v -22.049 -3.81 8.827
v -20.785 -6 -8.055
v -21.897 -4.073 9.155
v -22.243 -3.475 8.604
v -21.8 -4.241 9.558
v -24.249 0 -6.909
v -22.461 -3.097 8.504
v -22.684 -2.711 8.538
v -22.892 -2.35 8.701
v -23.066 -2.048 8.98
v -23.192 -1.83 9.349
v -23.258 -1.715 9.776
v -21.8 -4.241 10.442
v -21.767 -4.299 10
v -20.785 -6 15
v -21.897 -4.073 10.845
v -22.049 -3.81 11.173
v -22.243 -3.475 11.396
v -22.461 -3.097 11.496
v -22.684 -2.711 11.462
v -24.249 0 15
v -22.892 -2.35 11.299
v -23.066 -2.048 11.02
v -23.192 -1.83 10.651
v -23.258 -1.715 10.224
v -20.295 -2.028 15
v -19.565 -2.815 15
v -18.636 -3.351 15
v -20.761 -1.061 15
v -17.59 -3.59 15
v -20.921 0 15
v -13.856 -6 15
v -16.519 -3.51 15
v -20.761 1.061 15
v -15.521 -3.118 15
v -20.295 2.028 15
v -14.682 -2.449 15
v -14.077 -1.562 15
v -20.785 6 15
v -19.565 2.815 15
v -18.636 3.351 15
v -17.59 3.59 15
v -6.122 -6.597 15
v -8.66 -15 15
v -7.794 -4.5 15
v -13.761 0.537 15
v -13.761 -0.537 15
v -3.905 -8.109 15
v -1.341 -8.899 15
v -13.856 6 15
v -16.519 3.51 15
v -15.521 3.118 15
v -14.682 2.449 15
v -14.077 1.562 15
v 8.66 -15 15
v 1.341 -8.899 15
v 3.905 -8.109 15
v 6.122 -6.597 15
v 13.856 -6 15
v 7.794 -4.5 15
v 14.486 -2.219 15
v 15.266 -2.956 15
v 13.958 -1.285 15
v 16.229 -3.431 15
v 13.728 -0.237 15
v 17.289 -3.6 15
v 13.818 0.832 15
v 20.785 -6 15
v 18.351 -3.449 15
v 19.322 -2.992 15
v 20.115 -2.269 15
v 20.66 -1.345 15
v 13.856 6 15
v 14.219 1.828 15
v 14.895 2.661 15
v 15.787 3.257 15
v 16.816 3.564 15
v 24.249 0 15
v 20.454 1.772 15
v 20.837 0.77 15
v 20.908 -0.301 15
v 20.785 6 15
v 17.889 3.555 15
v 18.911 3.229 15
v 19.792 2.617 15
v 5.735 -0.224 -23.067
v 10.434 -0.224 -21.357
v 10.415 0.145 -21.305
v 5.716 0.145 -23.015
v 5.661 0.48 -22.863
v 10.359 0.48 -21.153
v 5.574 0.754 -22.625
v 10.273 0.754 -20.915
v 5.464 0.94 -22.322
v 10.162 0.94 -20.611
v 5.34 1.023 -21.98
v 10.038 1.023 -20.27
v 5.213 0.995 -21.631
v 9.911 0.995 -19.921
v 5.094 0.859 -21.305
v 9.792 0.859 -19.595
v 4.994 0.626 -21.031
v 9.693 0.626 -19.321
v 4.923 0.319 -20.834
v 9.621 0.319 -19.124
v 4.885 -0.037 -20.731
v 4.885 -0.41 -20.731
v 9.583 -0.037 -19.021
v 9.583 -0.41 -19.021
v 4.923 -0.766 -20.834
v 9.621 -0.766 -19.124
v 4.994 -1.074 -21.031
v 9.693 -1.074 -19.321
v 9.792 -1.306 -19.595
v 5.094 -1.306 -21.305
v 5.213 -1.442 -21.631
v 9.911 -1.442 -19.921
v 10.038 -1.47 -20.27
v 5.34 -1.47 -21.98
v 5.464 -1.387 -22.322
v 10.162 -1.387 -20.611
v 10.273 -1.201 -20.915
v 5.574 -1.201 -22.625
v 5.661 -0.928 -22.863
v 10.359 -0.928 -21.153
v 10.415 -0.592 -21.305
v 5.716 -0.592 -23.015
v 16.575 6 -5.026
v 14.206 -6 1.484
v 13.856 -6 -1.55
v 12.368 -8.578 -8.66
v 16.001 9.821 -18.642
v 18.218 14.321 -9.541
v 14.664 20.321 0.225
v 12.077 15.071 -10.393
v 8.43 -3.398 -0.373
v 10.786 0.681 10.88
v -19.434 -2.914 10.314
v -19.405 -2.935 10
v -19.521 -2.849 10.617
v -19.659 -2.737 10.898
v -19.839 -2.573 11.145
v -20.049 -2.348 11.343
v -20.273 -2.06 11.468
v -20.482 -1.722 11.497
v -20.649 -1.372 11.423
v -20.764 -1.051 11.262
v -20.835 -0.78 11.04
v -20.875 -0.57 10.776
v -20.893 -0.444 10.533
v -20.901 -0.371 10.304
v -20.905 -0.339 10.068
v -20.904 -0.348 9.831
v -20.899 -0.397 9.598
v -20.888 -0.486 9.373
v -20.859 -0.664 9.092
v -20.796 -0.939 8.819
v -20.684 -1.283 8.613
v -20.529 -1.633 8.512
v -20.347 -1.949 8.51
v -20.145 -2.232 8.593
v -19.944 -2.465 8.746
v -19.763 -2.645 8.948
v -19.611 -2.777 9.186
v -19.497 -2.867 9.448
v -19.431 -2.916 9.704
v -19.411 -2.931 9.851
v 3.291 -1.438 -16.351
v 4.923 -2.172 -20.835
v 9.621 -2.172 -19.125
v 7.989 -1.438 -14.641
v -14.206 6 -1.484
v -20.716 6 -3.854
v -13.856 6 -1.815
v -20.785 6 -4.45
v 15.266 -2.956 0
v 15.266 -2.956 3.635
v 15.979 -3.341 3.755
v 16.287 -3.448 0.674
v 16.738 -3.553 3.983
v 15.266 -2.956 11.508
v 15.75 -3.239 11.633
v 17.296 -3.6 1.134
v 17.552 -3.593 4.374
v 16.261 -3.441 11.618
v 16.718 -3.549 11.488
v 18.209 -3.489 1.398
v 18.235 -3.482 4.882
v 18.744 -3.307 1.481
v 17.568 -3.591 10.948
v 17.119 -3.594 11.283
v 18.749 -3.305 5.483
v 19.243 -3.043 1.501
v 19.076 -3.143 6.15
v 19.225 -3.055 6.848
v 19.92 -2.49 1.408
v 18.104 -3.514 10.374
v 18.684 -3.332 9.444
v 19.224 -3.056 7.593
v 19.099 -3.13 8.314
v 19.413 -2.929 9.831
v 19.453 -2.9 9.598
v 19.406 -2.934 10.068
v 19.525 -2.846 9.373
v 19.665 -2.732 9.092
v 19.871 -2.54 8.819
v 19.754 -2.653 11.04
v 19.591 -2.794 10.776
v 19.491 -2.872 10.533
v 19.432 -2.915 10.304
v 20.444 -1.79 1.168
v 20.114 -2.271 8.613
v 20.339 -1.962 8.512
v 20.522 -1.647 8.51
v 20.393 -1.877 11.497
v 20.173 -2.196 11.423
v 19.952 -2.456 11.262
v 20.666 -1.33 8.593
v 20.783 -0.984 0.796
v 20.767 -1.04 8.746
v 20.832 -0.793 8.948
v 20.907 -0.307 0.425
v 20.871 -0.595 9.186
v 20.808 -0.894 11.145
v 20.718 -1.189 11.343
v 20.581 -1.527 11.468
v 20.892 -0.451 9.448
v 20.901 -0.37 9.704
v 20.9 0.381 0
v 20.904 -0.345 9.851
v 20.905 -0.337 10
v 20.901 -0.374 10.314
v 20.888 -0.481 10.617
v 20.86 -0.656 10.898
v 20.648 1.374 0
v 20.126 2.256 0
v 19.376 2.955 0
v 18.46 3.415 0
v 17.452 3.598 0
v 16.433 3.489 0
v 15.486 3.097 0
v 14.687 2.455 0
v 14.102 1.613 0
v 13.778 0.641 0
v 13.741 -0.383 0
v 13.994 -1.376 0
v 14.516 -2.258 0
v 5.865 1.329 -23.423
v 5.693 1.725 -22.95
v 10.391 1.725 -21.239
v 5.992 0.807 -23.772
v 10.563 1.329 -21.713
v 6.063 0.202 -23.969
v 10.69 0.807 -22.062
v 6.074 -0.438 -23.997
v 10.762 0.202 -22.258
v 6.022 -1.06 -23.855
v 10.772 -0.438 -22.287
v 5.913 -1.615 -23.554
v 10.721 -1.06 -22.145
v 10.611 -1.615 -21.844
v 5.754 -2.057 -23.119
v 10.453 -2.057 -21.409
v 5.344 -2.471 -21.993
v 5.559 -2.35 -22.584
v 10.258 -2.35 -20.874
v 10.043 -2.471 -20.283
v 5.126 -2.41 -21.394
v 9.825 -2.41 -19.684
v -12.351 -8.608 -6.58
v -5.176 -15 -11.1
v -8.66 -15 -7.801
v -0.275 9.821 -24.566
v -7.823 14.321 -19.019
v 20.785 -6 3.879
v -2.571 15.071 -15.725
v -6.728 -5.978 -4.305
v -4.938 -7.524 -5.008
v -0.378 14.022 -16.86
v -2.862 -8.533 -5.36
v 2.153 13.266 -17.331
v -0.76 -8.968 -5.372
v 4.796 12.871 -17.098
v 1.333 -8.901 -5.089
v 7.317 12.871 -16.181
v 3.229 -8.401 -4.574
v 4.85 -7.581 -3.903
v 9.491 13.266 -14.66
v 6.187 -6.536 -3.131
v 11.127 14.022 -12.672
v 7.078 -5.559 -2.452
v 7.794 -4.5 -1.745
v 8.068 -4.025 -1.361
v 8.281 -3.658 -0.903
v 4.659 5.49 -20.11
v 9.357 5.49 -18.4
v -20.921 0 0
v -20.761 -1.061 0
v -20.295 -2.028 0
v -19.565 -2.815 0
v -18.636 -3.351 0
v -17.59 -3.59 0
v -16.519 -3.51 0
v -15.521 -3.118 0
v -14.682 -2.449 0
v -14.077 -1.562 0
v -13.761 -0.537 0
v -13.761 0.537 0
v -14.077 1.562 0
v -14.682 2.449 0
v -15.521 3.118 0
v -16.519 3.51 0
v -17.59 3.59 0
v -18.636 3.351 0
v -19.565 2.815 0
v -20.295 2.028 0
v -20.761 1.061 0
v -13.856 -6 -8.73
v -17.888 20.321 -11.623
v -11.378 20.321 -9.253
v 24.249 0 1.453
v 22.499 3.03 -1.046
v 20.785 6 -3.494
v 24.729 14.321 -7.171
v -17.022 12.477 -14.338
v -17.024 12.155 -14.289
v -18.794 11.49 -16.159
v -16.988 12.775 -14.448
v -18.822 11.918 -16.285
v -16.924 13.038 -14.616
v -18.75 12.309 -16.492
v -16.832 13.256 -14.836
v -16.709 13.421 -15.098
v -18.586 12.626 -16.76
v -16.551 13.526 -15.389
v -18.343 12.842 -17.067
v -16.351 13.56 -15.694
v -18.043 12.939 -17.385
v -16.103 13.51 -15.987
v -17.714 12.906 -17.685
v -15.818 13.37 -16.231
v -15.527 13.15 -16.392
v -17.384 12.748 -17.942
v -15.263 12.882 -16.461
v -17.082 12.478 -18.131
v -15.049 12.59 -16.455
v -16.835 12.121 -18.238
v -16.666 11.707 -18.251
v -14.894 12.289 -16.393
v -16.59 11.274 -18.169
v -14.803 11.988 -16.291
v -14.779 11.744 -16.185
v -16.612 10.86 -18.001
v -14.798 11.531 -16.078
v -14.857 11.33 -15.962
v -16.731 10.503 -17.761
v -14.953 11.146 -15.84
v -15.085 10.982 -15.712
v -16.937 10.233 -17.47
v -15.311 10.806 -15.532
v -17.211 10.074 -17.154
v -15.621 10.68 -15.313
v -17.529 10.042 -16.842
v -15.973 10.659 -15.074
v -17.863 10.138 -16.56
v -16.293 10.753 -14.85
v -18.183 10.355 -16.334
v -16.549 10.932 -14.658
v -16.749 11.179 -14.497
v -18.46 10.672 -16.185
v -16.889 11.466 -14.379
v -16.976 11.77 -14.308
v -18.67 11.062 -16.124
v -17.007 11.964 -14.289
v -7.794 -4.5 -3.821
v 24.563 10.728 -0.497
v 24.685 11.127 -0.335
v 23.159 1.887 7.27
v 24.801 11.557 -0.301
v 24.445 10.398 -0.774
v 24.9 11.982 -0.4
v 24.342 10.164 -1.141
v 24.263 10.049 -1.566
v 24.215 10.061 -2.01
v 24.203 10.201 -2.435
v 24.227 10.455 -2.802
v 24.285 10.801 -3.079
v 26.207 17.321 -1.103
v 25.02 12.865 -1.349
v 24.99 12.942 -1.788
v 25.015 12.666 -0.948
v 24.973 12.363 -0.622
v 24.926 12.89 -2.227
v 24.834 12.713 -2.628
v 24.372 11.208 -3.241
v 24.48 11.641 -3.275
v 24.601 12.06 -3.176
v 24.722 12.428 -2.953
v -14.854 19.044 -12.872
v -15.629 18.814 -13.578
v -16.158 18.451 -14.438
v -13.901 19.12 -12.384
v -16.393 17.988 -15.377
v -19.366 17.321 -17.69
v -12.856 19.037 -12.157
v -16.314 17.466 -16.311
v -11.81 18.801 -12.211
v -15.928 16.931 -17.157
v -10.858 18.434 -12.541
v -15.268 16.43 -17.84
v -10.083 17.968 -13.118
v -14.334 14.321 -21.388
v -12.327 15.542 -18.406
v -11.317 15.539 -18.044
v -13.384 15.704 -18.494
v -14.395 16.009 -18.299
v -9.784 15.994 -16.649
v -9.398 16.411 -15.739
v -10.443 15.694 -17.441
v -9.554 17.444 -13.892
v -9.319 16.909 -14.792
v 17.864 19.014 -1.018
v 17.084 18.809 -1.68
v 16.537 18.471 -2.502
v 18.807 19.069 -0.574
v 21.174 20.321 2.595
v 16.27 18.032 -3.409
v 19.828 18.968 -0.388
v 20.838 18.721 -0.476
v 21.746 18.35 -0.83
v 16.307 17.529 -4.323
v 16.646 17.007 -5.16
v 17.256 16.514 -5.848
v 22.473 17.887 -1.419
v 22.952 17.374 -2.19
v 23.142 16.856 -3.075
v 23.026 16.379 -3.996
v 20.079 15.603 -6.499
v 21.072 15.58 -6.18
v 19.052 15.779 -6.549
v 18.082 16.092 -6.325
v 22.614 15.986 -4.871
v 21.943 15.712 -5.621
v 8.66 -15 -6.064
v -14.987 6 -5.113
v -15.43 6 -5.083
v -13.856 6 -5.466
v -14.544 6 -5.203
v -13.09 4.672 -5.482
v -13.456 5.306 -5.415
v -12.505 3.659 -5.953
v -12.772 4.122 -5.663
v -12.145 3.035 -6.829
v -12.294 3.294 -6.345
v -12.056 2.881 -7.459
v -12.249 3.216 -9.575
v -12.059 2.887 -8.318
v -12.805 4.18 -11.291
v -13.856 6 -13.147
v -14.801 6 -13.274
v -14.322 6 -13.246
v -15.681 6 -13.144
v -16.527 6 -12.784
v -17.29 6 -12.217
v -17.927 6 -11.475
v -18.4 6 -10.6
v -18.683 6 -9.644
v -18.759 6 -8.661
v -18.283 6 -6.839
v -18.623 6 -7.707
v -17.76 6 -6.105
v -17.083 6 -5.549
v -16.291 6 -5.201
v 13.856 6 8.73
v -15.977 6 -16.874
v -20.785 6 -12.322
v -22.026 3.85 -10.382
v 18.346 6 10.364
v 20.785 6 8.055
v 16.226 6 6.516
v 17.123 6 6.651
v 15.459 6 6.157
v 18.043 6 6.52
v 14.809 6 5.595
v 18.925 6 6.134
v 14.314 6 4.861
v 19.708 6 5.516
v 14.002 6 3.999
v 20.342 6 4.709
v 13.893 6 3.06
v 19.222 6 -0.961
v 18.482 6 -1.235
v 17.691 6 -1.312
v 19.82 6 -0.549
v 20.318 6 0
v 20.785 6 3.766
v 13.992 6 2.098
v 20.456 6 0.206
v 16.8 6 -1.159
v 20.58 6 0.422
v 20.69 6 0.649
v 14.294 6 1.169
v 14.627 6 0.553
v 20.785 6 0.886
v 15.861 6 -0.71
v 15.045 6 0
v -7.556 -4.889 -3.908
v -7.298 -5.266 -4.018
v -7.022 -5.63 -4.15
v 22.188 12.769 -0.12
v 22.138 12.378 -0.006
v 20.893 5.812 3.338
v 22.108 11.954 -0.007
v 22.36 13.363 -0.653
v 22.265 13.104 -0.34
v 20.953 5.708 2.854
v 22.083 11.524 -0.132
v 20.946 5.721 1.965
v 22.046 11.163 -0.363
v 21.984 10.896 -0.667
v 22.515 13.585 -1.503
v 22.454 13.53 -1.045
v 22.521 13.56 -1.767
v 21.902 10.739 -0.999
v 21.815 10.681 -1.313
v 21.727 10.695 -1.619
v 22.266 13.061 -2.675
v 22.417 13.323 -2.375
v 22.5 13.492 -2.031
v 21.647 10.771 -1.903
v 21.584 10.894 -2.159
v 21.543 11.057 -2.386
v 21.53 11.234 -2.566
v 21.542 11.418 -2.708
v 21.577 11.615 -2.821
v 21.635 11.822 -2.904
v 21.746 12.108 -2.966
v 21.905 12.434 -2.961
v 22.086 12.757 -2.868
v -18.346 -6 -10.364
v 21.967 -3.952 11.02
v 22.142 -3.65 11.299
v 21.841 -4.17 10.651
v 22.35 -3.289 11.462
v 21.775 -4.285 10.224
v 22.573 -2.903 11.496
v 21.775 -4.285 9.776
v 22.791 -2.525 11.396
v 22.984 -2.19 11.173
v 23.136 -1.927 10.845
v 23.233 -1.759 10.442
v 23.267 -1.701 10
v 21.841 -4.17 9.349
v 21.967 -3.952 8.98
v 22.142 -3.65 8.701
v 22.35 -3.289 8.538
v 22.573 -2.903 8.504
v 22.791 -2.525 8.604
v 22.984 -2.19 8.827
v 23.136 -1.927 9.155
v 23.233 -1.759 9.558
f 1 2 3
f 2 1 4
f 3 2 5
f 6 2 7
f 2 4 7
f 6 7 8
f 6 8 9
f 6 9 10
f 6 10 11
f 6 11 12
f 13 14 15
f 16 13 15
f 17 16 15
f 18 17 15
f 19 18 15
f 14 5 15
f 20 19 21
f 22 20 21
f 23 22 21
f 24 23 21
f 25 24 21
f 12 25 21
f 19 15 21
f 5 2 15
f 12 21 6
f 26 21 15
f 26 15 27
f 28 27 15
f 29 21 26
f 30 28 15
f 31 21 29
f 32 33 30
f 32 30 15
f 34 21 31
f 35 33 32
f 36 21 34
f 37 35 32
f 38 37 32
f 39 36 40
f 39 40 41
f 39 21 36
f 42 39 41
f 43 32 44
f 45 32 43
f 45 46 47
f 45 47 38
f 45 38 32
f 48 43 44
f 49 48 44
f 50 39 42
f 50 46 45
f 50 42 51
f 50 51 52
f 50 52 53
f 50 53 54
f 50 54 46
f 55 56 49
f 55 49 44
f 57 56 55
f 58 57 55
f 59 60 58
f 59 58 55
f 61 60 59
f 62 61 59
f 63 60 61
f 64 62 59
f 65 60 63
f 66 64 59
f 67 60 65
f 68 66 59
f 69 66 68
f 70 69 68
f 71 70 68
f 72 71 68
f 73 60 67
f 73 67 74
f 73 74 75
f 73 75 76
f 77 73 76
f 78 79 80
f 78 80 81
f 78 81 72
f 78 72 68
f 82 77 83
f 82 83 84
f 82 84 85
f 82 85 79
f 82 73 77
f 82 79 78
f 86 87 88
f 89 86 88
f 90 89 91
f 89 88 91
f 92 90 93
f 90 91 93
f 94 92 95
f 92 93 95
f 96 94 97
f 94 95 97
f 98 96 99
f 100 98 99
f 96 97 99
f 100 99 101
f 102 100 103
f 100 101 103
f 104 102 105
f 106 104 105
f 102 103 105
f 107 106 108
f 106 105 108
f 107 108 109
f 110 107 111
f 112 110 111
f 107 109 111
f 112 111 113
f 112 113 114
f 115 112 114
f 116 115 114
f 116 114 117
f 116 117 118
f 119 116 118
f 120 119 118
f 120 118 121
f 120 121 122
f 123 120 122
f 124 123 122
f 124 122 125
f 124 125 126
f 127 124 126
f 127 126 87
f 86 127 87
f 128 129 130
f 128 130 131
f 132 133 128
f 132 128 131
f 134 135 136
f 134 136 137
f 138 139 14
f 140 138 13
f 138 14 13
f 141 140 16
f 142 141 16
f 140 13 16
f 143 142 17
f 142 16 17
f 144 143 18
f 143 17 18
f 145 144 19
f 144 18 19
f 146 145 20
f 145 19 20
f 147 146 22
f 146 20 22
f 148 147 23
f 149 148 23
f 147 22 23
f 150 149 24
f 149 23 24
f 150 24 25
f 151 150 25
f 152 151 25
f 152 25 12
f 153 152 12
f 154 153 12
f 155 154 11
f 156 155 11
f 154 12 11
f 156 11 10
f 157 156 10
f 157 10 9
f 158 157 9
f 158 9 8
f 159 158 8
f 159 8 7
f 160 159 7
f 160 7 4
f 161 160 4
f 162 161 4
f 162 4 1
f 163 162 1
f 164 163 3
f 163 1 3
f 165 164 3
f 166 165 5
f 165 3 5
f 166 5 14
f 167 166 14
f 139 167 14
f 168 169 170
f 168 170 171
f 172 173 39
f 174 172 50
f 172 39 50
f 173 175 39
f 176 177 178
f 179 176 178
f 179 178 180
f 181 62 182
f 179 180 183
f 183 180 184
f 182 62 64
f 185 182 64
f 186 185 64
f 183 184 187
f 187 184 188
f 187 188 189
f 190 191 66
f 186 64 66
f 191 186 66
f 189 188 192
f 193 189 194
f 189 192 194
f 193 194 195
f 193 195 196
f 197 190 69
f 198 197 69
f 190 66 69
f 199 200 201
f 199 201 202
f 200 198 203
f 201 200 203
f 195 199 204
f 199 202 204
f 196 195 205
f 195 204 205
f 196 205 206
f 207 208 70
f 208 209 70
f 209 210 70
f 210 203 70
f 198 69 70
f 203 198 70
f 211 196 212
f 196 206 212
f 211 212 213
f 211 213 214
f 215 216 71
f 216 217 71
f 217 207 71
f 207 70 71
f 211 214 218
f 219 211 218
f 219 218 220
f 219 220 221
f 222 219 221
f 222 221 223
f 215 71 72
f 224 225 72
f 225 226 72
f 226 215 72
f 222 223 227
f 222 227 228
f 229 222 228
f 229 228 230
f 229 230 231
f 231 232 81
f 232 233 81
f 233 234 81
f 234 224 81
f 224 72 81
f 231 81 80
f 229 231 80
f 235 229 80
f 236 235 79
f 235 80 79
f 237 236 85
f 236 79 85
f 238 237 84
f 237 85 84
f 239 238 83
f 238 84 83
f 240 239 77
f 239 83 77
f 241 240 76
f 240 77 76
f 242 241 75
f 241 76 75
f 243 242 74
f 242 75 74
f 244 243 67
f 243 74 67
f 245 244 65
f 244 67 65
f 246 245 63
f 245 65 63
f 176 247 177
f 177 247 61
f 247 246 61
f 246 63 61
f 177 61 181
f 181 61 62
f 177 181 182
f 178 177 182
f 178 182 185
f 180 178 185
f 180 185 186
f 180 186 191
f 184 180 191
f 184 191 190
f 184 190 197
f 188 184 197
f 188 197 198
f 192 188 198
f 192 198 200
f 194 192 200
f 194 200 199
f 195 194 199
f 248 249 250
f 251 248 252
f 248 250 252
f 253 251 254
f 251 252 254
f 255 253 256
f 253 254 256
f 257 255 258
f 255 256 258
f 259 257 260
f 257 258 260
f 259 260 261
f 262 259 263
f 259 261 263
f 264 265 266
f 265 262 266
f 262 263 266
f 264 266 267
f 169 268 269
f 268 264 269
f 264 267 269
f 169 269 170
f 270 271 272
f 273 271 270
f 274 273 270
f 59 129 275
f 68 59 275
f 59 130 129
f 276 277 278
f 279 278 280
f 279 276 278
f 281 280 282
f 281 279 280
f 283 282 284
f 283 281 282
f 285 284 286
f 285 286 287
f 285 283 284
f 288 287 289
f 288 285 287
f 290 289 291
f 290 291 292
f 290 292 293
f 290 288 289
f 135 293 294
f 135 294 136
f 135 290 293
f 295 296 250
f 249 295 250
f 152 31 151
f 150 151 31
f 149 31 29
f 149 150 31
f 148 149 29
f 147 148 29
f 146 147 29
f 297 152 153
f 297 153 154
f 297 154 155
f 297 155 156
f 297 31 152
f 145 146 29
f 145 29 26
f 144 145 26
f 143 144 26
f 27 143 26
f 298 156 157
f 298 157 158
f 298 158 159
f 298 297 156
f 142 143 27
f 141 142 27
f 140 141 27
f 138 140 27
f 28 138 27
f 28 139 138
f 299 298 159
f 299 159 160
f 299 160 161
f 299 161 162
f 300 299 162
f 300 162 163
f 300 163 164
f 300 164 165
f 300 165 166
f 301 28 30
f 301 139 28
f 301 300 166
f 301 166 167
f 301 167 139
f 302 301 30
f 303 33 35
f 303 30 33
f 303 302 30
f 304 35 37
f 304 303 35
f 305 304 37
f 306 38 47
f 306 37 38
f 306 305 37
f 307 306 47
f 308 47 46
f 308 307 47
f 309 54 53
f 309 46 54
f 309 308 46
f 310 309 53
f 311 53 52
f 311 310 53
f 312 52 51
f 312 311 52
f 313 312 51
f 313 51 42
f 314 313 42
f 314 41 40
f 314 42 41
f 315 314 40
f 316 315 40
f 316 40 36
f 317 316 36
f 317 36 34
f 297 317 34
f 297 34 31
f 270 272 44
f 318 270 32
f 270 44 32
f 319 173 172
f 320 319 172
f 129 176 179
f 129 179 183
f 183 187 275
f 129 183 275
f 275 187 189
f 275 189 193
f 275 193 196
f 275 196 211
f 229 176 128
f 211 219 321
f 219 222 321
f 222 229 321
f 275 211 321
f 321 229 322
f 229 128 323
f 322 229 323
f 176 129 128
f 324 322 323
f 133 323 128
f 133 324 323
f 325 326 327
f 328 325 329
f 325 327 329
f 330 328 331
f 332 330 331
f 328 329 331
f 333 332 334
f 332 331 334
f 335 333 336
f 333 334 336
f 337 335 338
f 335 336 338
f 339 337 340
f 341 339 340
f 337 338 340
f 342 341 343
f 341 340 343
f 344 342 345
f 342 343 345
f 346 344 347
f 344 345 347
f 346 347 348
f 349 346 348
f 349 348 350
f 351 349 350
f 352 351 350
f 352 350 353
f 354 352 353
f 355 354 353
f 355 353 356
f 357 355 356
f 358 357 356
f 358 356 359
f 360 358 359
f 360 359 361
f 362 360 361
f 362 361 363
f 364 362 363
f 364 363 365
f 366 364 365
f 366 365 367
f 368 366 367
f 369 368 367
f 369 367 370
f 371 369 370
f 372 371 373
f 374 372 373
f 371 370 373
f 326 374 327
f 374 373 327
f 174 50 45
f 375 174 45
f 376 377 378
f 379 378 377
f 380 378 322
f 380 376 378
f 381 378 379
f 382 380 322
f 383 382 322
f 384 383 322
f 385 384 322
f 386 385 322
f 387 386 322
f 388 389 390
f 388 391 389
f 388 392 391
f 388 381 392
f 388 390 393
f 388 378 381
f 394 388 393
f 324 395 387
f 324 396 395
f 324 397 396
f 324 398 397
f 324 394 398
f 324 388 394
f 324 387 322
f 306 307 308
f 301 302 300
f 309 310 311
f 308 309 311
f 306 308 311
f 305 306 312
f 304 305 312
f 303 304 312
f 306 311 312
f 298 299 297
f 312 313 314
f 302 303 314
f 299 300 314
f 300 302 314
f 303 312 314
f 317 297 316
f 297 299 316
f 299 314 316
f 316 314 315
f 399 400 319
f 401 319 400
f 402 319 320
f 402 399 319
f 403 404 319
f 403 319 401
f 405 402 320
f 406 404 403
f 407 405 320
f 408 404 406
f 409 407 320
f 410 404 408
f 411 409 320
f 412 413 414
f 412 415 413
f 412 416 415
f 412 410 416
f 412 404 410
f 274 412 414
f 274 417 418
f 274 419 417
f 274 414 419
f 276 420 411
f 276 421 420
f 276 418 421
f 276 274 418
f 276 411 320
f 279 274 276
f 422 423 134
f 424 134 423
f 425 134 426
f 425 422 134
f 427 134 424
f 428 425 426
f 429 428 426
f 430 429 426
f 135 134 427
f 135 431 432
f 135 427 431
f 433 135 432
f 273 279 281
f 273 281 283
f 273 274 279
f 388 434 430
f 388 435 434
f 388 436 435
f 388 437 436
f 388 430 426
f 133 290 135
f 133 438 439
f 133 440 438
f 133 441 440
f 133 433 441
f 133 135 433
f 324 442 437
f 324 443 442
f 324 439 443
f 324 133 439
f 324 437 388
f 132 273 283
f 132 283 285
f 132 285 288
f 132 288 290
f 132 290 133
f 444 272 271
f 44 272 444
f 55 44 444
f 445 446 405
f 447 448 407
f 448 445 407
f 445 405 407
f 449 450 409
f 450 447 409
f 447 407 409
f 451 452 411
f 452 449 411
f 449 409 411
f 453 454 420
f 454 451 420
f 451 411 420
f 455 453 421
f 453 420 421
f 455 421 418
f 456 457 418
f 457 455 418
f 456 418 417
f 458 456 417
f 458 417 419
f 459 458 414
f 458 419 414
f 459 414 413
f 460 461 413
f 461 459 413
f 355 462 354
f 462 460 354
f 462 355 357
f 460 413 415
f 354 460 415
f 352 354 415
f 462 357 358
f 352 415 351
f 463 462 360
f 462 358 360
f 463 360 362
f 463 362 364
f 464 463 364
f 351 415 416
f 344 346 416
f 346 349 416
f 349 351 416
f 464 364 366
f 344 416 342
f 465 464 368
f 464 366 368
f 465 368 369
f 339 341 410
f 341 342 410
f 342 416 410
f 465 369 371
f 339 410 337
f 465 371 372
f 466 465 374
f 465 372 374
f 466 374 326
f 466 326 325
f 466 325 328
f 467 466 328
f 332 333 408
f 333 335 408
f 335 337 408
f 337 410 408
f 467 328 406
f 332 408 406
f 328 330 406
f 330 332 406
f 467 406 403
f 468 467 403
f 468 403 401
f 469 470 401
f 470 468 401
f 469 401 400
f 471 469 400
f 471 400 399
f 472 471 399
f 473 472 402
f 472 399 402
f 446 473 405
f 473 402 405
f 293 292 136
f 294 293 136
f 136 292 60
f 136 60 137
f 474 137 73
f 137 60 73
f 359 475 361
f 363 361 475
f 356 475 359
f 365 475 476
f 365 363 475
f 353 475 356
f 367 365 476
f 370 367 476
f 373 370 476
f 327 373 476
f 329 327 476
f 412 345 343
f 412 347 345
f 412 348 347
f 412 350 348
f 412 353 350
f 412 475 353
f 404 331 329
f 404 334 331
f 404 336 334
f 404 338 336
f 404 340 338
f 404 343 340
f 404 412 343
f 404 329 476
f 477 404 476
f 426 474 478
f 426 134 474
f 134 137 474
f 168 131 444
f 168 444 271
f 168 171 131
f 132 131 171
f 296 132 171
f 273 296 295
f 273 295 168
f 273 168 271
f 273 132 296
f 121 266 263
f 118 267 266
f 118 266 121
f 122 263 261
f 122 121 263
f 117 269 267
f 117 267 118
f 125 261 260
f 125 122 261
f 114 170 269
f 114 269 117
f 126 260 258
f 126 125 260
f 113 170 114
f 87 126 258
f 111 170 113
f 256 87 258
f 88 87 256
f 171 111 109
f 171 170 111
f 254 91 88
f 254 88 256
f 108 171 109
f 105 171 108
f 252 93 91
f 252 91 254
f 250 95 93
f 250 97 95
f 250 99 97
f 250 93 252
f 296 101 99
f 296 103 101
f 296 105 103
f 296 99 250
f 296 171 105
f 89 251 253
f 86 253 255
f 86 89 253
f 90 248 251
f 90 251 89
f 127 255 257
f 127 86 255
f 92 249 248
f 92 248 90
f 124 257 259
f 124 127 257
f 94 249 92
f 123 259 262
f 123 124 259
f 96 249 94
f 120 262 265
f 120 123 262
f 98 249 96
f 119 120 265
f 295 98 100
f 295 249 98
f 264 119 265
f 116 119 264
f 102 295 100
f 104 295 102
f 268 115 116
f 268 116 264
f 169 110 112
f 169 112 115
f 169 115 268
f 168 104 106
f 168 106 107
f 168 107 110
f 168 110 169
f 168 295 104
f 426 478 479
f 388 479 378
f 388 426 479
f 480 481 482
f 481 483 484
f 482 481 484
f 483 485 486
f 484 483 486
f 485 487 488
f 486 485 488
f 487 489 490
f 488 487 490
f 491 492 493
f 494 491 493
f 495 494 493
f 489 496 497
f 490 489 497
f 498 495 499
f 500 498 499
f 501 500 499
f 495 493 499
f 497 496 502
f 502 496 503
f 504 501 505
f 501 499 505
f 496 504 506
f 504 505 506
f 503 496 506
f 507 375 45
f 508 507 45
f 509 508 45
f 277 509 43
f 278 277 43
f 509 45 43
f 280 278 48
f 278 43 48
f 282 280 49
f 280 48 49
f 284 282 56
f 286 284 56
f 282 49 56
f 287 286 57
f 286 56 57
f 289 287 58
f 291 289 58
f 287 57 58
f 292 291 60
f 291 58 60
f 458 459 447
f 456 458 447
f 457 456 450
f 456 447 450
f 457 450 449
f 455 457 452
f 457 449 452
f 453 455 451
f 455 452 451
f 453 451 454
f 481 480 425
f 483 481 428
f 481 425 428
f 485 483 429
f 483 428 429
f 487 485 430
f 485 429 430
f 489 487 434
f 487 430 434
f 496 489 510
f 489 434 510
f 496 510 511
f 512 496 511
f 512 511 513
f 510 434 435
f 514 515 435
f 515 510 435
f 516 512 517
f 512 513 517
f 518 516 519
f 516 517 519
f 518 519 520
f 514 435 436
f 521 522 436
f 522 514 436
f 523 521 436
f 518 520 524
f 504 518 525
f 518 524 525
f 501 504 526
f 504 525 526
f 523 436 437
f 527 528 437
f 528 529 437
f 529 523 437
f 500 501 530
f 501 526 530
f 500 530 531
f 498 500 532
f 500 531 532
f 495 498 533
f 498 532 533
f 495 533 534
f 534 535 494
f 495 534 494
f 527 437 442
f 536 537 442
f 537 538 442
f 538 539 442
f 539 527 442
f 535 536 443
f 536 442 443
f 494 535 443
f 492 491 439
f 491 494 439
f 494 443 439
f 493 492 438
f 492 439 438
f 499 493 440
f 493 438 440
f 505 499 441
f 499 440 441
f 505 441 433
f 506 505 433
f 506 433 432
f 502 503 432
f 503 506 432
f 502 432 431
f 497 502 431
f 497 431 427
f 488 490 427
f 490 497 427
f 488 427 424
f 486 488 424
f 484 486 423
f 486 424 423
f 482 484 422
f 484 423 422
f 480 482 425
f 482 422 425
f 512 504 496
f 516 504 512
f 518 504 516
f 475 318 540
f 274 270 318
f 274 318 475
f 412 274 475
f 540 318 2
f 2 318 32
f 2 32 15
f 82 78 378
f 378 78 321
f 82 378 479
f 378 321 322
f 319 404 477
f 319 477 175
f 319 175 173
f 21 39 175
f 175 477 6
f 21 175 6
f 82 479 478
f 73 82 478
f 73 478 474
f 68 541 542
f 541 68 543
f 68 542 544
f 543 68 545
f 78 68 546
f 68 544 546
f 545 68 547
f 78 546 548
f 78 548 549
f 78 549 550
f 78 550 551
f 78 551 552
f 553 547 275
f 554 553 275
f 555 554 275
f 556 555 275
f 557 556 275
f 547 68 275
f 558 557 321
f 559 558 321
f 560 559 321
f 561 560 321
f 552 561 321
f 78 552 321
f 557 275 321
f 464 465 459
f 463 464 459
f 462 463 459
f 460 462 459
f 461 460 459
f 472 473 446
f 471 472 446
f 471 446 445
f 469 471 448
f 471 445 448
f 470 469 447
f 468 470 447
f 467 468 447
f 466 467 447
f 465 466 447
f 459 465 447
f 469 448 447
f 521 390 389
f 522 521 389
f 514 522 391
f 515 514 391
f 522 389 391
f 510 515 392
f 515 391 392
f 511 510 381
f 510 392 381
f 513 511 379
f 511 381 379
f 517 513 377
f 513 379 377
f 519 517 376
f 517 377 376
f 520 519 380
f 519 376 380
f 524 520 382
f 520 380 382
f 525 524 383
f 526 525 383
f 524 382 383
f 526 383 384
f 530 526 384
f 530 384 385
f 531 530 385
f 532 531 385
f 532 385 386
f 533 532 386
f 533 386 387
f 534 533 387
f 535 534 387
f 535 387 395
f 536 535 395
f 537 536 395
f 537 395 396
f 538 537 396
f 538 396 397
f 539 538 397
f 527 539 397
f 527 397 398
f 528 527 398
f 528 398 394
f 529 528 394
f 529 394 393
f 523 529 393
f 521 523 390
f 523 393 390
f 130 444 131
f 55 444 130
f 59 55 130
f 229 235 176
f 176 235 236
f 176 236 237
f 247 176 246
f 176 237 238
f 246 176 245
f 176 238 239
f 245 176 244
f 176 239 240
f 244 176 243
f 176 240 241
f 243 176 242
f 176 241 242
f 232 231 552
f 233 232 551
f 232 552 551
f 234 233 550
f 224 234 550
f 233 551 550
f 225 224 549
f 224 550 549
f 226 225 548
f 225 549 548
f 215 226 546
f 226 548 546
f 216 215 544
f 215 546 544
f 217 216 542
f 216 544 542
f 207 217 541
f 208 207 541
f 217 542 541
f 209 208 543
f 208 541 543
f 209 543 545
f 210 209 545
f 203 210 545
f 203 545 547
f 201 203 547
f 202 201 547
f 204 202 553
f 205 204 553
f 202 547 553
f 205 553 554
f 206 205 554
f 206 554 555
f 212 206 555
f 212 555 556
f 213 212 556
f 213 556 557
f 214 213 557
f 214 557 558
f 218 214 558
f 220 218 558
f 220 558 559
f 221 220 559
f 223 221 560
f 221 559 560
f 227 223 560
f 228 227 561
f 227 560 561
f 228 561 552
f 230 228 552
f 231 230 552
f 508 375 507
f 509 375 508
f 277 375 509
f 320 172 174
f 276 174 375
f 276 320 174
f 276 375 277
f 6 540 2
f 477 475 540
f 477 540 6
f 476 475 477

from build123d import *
from build123d.topology import SkipClean

# Parameters (mm, degrees)
SKETCH5_R                      = 3.6
BOSS_EXTRUDE2_DEPTH            = 15
BOSS_EXTRUDE3_REACH            = 51.045
SKETCH6_R                      = 3.5
SKETCH6_R_2                    = 3.6
SKETCH7_R                      = 3.6
SKETCH7_R_2                    = 9
CUT_EXTRUDE1_DEPTH             = 15
SKETCH8_W                      = 48.497422612
SKETCH8_H                      = 6.75711345
CUT_EXTRUDE2_DEPTH             = 42.269694796
CUT_EXTRUDE2_DEPTH_BACK        = 42.269694796
CUT_EXTRUDE3_DEPTH             = 52.625225339
CUT_EXTRUDE3_DEPTH_BACK        = 52.625225339
BOSS_EXTRUDE4_REACH            = 43.27
CUT_EXTRUDE4_DEPTH             = 50.044816115
CUT_EXTRUDE4_DEPTH_BACK        = 50.044816115
CUT_EXTRUDE5_REACH             = 61.364
CUT_EXTRUDE5_END_RADIUS        = 3.6
SKETCH12_R                     = 1.5
CUT_EXTRUDE5_DIRECTION_2_DEPTH = 60.36438735
CUT_EXTRUDE6_REACH             = 59.915
CUT_EXTRUDE6_END_RADIUS        = 3.6
SKETCH13_R                     = 1.5
CUT_EXTRUDE7_REACH             = 57.894
CUT_EXTRUDE7_END_RADIUS        = 3.5
SKETCH14_R                     = 1.5
CUT_EXTRUDE8_REACH             = 58.167
CUT_EXTRUDE8_END_RADIUS        = 3.6
SKETCH15_R                     = 1.5
BOSS_EXTRUDE5_DEPTH            = 7
SKETCH17_R                     = 1.25
CUT_EXTRUDE9_DEPTH             = 43.79253318
CUT_EXTRUDE10_REACH            = 44.793


with BuildPart() as part:
    # Sketch5 → Boss-Extrude2 (new body)
    with BuildSketch(Plane.XY):
        with BuildLine():
            Line((-13.856406461, -6), (-8.660254038, -15))
            Line((-8.660254038, -15), (8.660254038, -15))
            Line((8.660254038, -15), (13.856406461, -6))
            Line((13.856406461, -6), (20.784609691, -6))
            Line((20.784609691, -6), (24.248711306, 0))
            Line((24.248711306, 0), (20.784609691, 6))
            Line((20.784609691, 6), (13.856406461, 6))
            Line((13.856406461, 6), (7.794228634, -4.5))
            ThreePointArc((7.794228634, -4.5), (0, -9), (-7.794228634, -4.5))
            Line((-7.794228634, -4.5), (-13.856406461, 6))
            Line((-13.856406461, 6), (-20.784609691, 6))
            Line((-20.784609691, 6), (-24.248711306, 0))
            Line((-24.248711306, 0), (-20.784609691, -6))
            Line((-20.784609691, -6), (-13.856406461, -6))
        make_face()
        with Locations((17.320508076, 0)):
            Circle(SKETCH5_R, mode=Mode.SUBTRACT)
        with Locations(Location((-17.320508076, 0, 0), (0, 0, 180))):
            Circle(SKETCH5_R, mode=Mode.SUBTRACT)
    extrude(amount=BOSS_EXTRUDE2_DEPTH)

    # Boss-Extrude3: up to this face of the body (flat: up to its plane)
    boss_extrude3_end = Plane(part.part.faces().sort_by_distance((0, -15, 7.5))[0])
    # Sketch6 → Boss-Extrude3 (add, up to the picked face)
    with BuildSketch(Plane(origin=(3.420201433, 17.320508076, -9.396926208), x_dir=(0.9852692806486326, -0.15031328924160728, 0.08154973750721087), z_dir=(0.1710100716628295, 0.8660254037844416, -0.46984631039295055)), mode=Mode.PRIVATE) as boss_extrude3_sk1:
        with BuildLine():
            Line((-3.750248683, 16.909631422), (-11.411676306, 9.888055617))
            Line((-11.411676306, 9.888055617), (-18.019394195, 11.970857649))
            Line((-18.019394195, 11.970857649), (-23.12701261, 7.289807113))
            Line((-23.12701261, 7.289807113), (-21.626913137, 0.525954544))
            Line((-21.626913137, 0.525954544), (-15.019195248, -1.556847488))
            Line((-15.019195248, -1.556847488), (-6.080863021, 6.634990951))
            ThreePointArc((-6.080863021, 6.634990951), (2.705639206, 8.583677329), (8.786502228, 1.948686378))
            Line((8.786502228, 1.948686378), (11.411676306, -9.888055617))
            Line((11.411676306, -9.888055617), (18.019394195, -11.970857649))
            Line((18.019394195, -11.970857649), (23.12701261, -7.289807113))
            Line((23.12701261, -7.289807113), (21.626913137, -0.525954544))
            Line((21.626913137, -0.525954544), (15.019195248, 1.556847488))
            Line((15.019195248, 1.556847488), (12.769046038, 11.702626341))
            Line((12.769046038, 11.702626341), (-3.750248683, 16.909631422))
        make_face()
        with Locations(Location((16.519294721, -5.20700508, 0), (0, 0, 255.051444771))):
            Circle(SKETCH6_R, mode=Mode.SUBTRACT)
        with Locations(Location((-16.519294721, 5.20700508, 0), (0, 0, 270))):
            Circle(SKETCH6_R_2, mode=Mode.SUBTRACT)
    boss_extrude3_tool1 = split(extrude(boss_extrude3_sk1.sketch, amount=-BOSS_EXTRUDE3_REACH, mode=Mode.PRIVATE), bisect_by=boss_extrude3_end, keep=Keep.BOTH, mode=Mode.PRIVATE)
    add(boss_extrude3_tool1.solids().sort_by(Axis((-3.686083, 12.206833, -21.408979), (-0.1710100716628295, -0.8660254037844416, 0.46984631039295055)))[0])

    # Sketch7 → Cut-Extrude1 (cut)
    with BuildSketch(Plane.XY.offset(15)):
        with Locations(Location((-17.320508076, 0, 0), (0, 0, 180))):
            Circle(SKETCH7_R)
        Circle(SKETCH7_R_2)
        with Locations(Location((17.320508076, 0, 0), (0, 0, 235.205682737))):
            Circle(SKETCH7_R)
    extrude(amount=-CUT_EXTRUDE1_DEPTH, mode=Mode.SUBTRACT)

    # Sketch8 → Cut-Extrude2 (cut, two sides)
    with BuildSketch(Plane(origin=(0, 0, 0), x_dir=(1, 0, 0), z_dir=(0, 1, 0))) as cut_extrude2_sk:
        with Locations((0, -18.378556725)):
            Rectangle(SKETCH8_W, SKETCH8_H)
    extrude(amount=CUT_EXTRUDE2_DEPTH, mode=Mode.SUBTRACT)
    extrude(cut_extrude2_sk.sketch, amount=-CUT_EXTRUDE2_DEPTH_BACK, mode=Mode.SUBTRACT)

    # Sketch9 → Cut-Extrude3 (cut, two sides)
    with BuildSketch(Plane.XY.offset(15)) as cut_extrude3_sk:
        Polygon((-8.660254038, -15), (-13.856406461, -6), (-20.784609691, -6), (-24.248711306, 0), (-25.748316405, -15), align=None)
        Polygon((8.660254038, -15), (13.856406461, -6), (20.784609691, -6), (24.248711306, 0), (19.659605529, -15), align=None)
    extrude(amount=CUT_EXTRUDE3_DEPTH, mode=Mode.SUBTRACT)
    extrude(cut_extrude3_sk.sketch, amount=-CUT_EXTRUDE3_DEPTH_BACK, mode=Mode.SUBTRACT)

    # Boss-Extrude4: up to this face of the body (flat: up to its plane)
    boss_extrude4_end = Plane(part.part.faces().sort_by_distance((5.307826124, -2.386655305, -15.033840033))[0])
    # Sketch10 → Boss-Extrude4 (add, up to the picked face)
    with BuildSketch(Plane(origin=(0, 0, 0), x_dir=(-1, 0, 0), z_dir=(0, 0, -1)), mode=Mode.PRIVATE) as boss_extrude4_sk1:
        with BuildLine():
            Line((-7.794228634, -4.5), (-13.856406461, 6))
            Line((-13.856406461, 6), (-20.784609691, 6))
            Line((-20.784609691, 6), (-24.248711306, 0))
            Line((-24.248711306, 0), (-20.784609691, -6))
            Line((-20.784609691, -6), (-13.856406461, -6))
            Line((-13.856406461, -6), (-8.660254038, -15))
            Line((-8.660254038, -15), (8.660254038, -15))
            Line((8.660254038, -15), (13.856406461, -6))
            Line((13.856406461, -6), (20.784609691, -6))
            Line((20.784609691, -6), (24.248711306, 0))
            Line((24.248711306, 0), (20.784609691, 6))
            Line((20.784609691, 6), (13.856406461, 6))
            Line((13.856406461, 6), (7.794228634, -4.5))
            ThreePointArc((7.794228634, -4.5), (0, -9), (-7.794228634, -4.5))
        make_face()
    boss_extrude4_tool1 = split(extrude(boss_extrude4_sk1.sketch, amount=BOSS_EXTRUDE4_REACH, mode=Mode.PRIVATE), bisect_by=boss_extrude4_end, keep=Keep.BOTH, mode=Mode.PRIVATE)
    add(boss_extrude4_tool1.solids().sort_by(Axis((11.283002, 0.485756, 0), (0, 0, -1)))[0])

    # Sketch11 → Cut-Extrude4 (cut, two sides)
    with SkipClean():  # the faces are left unmerged after this step: merging them gives an invalid solid
        with BuildSketch(Plane(origin=(3.420201433, 17.320508076, -9.396926208), x_dir=(0.9852692806486326, -0.15031328924160733, 0.08154973750721092), z_dir=(0.17101007166282958, 0.8660254037844416, -0.4698463103929507))) as cut_extrude4_sk:
            Polygon((-3.750248683, 16.909631422), (-11.411676306, 9.888055617), (-18.019394195, 11.970857649), (-24.454933942, 6.072788464), (-26.114385656, 23.958974435), align=None)
            Polygon((12.769046038, 11.702626341), (15.019195248, 1.556847488), (24.009999606, -1.277121199), (23.108119871, 8.443673045), align=None)
        extrude(amount=CUT_EXTRUDE4_DEPTH, mode=Mode.SUBTRACT)
        extrude(cut_extrude4_sk.sketch, amount=-CUT_EXTRUDE4_DEPTH_BACK, mode=Mode.SUBTRACT)

    # Cut-Extrude5: up to this cylinder (the profile starts outside it)
    with SkipClean():  # the faces are left unmerged after this step: merging them gives an invalid solid
        cut_extrude5_end = Plane(origin=(-17.320508076, 0, 10), z_dir=(0, 0, -1)) * Cylinder(CUT_EXTRUDE5_END_RADIUS, 130.928, mode=Mode.PRIVATE)
        # Sketch12 → Cut-Extrude5 (cut, up to the surface)
        with BuildSketch(Plane(origin=(-18.186533479, -10.5, 0), x_dir=(0, 0, 1), z_dir=(-0.8660254037844402, -0.4999999999999974, 0)), mode=Mode.PRIVATE) as cut_extrude5_sk1:
            with Locations(Location((10, 8.660254038, 0), (0, 0, 270))):
                Circle(SKETCH12_R)
        cut_extrude5_tool1 = extrude(cut_extrude5_sk1.sketch, amount=-CUT_EXTRUDE5_REACH, mode=Mode.PRIVATE) - cut_extrude5_end
        add(cut_extrude5_tool1.solids().sort_by_distance((-22.51666, -3, 10))[0], mode=Mode.SUBTRACT)

    # Sketch12 → Cut-Extrude5 direction 2 (cut)
    with SkipClean():  # the faces are left unmerged after this step: merging them gives an invalid solid
        with BuildSketch(Plane(origin=(-18.186533479, -10.5, 0), x_dir=(0, 0, 1), z_dir=(-0.8660254037844402, -0.4999999999999974, 0))):
            with Locations(Location((10, 8.660254038, 0), (0, 0, 270))):
                Circle(SKETCH12_R)
        extrude(amount=CUT_EXTRUDE5_DIRECTION_2_DEPTH, mode=Mode.SUBTRACT)

    # Cut-Extrude6: up to this cylinder (the profile starts outside it)
    with SkipClean():  # the faces are left unmerged after this step: merging them gives an invalid solid
        cut_extrude6_end = Plane(origin=(17.320508076, 0, 10), z_dir=(0, 0, -1)) * Cylinder(CUT_EXTRUDE6_END_RADIUS, 128.03, mode=Mode.PRIVATE)
        # Sketch13 → Cut-Extrude6 (cut, up to the surface)
        with BuildSketch(Plane(origin=(18.186533479, -10.5, 0), x_dir=(0, 0, -1), z_dir=(0.8660254037844402, -0.4999999999999974, 0)), mode=Mode.PRIVATE) as cut_extrude6_sk1:
            with Locations(Location((-10, 8.660254038, 0), (0, 0, 90))):
                Circle(SKETCH13_R)
        cut_extrude6_tool1 = extrude(cut_extrude6_sk1.sketch, amount=-CUT_EXTRUDE6_REACH, mode=Mode.PRIVATE) - cut_extrude6_end
        add(cut_extrude6_tool1.solids().sort_by_distance((22.51666, -3, 10))[0], mode=Mode.SUBTRACT)

    # Cut-Extrude7: up to this cylinder (the profile starts outside it)
    with SkipClean():  # the faces are left unmerged after this step: merging them gives an invalid solid
        cut_extrude7_end = Plane(origin=(18.841104668, 12.990380885, -1.123731908), z_dir=(0.1710100716628295, 0.8660254037844416, -0.46984631039295055)) * Cylinder(CUT_EXTRUDE7_END_RADIUS, 123.788, mode=Mode.PRIVATE)
        # Sketch14 → Cut-Extrude7 (cut, up to the surface)
        with BuildSketch(Plane(origin=(20.199831702, -5.25, -2.324714867), x_dir=(-0.10714116317598488, 0.027846326393864564, -0.9938537886729936), z_dir=(0.9618967477123858, -0.2499999999999971, -0.1107007079486697)), mode=Mode.PRIVATE) as cut_extrude7_sk1:
            with Locations(Location((-0.540098175, 17.3120852, 0), (0, 0, 90))):
                Circle(SKETCH14_R)
        cut_extrude7_tool1 = extrude(cut_extrude7_sk1.sketch, amount=-CUT_EXTRUDE7_REACH, mode=Mode.PRIVATE) - cut_extrude7_end
        add(cut_extrude7_tool1.solids().sort_by_distance((24.612485, 11.490381, -1.787936))[0], mode=Mode.SUBTRACT)

    # Cut-Extrude8: up to this cylinder (the profile starts outside it)
    with SkipClean():  # the faces are left unmerged after this step: merging them gives an invalid solid
        cut_extrude8_end = Plane(origin=(-13.710802565, 12.990380989, -12.971657273), z_dir=(0.1710100716628295, 0.8660254037844416, -0.46984631039295055)) * Cylinder(CUT_EXTRUDE8_END_RADIUS, 124.534, mode=Mode.PRIVATE)
        # Sketch15 → Cut-Extrude8 (cut, up to the surface)
        with BuildSketch(Plane(origin=(-13.979670915, -5.25, -14.765036441), x_dir=(-0.7462207140017174, 0.22302336376340076, 0.6272282082387757), z_dir=(-0.6656986149863668, -0.24999999999999695, -0.703096973400707)), mode=Mode.PRIVATE) as cut_extrude8_sk1:
            with Locations(Location((4.992253977, 16.585457492, 0), (0, 0, 346.683055075))):
                Circle(SKETCH15_R)
        cut_extrude8_tool1 = extrude(cut_extrude8_sk1.sketch, amount=-CUT_EXTRUDE8_REACH, mode=Mode.PRIVATE) - cut_extrude8_end
        add(cut_extrude8_tool1.solids().sort_by_distance((-17.704994, 11.490381, -17.190239))[0], mode=Mode.SUBTRACT)

    # Sketch16 → Boss-Extrude5 (add)
    with SkipClean():  # the faces are left unmerged after this step: merging them gives an invalid solid
        with BuildSketch(Plane(origin=(4.442971991, -7.5, -12.20696522), x_dir=(-0.9551265184097965, -0.15505701444619138, -0.25237007766653785), z_dir=(0.2961981327260197, -0.49999999999999495, -0.8137976813493785))):
            Polygon((-3.712913405, 6.439275895), (-5.145268749, 14.310003826), (-0.226063792, 15.205225916), (1.206291552, 7.334497985), align=None)
        extrude(amount=BOSS_EXTRUDE5_DEPTH)

    # Sketch17 → Cut-Extrude9 (cut, through all)
    with SkipClean():  # the faces are left unmerged after this step: merging them gives an invalid solid
        with BuildSketch(Plane(origin=(2.349231552, 0, 0.855050358), x_dir=(0.3420201433256625, 0, -0.9396926207859106), z_dir=(0.9396926207859108, 0, 0.34202014332566255))):
            with Locations((22.387495374, -0.223720558)):
                Circle(SKETCH17_R)
        extrude(amount=-CUT_EXTRUDE9_DEPTH, mode=Mode.SUBTRACT)

    # Sketch18 → Cut-Extrude10 (cut, up to next)
    with BuildSketch(Plane(origin=(2.349231552, 0, 0.855050358), x_dir=(0.3420201433256622, 0, -0.9396926207859108), z_dir=(0.9396926207859108, 0, 0.3420201433256622)), mode=Mode.PRIVATE) as cut_extrude10_sk1:
        with BuildLine():
            Line((20.490381057, 5.490381057), (23.512495374, 1.7248366))
            ThreePointArc((23.512495374, 1.7248366), (24.336052532, -1.348720558), (21.262495374, -2.172277717))
            Line((21.262495374, -2.172277717), (16.490381057, -1.437822174))
            Line((16.490381057, -1.437822174), (22.552558883, -4.937822174))
            Line((22.552558883, -4.937822174), (26.552558883, 1.990381057))
            Line((26.552558883, 1.990381057), (20.490381057, 5.490381057))
        make_face()
    cut_extrude10_tool1 = extrude(cut_extrude10_sk1.sketch, amount=-CUT_EXTRUDE10_REACH, mode=Mode.PRIVATE) & part.part
    add(cut_extrude10_tool1.solids().sort_by_distance((9.91282, 3.698312, -19.925739))[0], mode=Mode.SUBTRACT)


solid = part.part
